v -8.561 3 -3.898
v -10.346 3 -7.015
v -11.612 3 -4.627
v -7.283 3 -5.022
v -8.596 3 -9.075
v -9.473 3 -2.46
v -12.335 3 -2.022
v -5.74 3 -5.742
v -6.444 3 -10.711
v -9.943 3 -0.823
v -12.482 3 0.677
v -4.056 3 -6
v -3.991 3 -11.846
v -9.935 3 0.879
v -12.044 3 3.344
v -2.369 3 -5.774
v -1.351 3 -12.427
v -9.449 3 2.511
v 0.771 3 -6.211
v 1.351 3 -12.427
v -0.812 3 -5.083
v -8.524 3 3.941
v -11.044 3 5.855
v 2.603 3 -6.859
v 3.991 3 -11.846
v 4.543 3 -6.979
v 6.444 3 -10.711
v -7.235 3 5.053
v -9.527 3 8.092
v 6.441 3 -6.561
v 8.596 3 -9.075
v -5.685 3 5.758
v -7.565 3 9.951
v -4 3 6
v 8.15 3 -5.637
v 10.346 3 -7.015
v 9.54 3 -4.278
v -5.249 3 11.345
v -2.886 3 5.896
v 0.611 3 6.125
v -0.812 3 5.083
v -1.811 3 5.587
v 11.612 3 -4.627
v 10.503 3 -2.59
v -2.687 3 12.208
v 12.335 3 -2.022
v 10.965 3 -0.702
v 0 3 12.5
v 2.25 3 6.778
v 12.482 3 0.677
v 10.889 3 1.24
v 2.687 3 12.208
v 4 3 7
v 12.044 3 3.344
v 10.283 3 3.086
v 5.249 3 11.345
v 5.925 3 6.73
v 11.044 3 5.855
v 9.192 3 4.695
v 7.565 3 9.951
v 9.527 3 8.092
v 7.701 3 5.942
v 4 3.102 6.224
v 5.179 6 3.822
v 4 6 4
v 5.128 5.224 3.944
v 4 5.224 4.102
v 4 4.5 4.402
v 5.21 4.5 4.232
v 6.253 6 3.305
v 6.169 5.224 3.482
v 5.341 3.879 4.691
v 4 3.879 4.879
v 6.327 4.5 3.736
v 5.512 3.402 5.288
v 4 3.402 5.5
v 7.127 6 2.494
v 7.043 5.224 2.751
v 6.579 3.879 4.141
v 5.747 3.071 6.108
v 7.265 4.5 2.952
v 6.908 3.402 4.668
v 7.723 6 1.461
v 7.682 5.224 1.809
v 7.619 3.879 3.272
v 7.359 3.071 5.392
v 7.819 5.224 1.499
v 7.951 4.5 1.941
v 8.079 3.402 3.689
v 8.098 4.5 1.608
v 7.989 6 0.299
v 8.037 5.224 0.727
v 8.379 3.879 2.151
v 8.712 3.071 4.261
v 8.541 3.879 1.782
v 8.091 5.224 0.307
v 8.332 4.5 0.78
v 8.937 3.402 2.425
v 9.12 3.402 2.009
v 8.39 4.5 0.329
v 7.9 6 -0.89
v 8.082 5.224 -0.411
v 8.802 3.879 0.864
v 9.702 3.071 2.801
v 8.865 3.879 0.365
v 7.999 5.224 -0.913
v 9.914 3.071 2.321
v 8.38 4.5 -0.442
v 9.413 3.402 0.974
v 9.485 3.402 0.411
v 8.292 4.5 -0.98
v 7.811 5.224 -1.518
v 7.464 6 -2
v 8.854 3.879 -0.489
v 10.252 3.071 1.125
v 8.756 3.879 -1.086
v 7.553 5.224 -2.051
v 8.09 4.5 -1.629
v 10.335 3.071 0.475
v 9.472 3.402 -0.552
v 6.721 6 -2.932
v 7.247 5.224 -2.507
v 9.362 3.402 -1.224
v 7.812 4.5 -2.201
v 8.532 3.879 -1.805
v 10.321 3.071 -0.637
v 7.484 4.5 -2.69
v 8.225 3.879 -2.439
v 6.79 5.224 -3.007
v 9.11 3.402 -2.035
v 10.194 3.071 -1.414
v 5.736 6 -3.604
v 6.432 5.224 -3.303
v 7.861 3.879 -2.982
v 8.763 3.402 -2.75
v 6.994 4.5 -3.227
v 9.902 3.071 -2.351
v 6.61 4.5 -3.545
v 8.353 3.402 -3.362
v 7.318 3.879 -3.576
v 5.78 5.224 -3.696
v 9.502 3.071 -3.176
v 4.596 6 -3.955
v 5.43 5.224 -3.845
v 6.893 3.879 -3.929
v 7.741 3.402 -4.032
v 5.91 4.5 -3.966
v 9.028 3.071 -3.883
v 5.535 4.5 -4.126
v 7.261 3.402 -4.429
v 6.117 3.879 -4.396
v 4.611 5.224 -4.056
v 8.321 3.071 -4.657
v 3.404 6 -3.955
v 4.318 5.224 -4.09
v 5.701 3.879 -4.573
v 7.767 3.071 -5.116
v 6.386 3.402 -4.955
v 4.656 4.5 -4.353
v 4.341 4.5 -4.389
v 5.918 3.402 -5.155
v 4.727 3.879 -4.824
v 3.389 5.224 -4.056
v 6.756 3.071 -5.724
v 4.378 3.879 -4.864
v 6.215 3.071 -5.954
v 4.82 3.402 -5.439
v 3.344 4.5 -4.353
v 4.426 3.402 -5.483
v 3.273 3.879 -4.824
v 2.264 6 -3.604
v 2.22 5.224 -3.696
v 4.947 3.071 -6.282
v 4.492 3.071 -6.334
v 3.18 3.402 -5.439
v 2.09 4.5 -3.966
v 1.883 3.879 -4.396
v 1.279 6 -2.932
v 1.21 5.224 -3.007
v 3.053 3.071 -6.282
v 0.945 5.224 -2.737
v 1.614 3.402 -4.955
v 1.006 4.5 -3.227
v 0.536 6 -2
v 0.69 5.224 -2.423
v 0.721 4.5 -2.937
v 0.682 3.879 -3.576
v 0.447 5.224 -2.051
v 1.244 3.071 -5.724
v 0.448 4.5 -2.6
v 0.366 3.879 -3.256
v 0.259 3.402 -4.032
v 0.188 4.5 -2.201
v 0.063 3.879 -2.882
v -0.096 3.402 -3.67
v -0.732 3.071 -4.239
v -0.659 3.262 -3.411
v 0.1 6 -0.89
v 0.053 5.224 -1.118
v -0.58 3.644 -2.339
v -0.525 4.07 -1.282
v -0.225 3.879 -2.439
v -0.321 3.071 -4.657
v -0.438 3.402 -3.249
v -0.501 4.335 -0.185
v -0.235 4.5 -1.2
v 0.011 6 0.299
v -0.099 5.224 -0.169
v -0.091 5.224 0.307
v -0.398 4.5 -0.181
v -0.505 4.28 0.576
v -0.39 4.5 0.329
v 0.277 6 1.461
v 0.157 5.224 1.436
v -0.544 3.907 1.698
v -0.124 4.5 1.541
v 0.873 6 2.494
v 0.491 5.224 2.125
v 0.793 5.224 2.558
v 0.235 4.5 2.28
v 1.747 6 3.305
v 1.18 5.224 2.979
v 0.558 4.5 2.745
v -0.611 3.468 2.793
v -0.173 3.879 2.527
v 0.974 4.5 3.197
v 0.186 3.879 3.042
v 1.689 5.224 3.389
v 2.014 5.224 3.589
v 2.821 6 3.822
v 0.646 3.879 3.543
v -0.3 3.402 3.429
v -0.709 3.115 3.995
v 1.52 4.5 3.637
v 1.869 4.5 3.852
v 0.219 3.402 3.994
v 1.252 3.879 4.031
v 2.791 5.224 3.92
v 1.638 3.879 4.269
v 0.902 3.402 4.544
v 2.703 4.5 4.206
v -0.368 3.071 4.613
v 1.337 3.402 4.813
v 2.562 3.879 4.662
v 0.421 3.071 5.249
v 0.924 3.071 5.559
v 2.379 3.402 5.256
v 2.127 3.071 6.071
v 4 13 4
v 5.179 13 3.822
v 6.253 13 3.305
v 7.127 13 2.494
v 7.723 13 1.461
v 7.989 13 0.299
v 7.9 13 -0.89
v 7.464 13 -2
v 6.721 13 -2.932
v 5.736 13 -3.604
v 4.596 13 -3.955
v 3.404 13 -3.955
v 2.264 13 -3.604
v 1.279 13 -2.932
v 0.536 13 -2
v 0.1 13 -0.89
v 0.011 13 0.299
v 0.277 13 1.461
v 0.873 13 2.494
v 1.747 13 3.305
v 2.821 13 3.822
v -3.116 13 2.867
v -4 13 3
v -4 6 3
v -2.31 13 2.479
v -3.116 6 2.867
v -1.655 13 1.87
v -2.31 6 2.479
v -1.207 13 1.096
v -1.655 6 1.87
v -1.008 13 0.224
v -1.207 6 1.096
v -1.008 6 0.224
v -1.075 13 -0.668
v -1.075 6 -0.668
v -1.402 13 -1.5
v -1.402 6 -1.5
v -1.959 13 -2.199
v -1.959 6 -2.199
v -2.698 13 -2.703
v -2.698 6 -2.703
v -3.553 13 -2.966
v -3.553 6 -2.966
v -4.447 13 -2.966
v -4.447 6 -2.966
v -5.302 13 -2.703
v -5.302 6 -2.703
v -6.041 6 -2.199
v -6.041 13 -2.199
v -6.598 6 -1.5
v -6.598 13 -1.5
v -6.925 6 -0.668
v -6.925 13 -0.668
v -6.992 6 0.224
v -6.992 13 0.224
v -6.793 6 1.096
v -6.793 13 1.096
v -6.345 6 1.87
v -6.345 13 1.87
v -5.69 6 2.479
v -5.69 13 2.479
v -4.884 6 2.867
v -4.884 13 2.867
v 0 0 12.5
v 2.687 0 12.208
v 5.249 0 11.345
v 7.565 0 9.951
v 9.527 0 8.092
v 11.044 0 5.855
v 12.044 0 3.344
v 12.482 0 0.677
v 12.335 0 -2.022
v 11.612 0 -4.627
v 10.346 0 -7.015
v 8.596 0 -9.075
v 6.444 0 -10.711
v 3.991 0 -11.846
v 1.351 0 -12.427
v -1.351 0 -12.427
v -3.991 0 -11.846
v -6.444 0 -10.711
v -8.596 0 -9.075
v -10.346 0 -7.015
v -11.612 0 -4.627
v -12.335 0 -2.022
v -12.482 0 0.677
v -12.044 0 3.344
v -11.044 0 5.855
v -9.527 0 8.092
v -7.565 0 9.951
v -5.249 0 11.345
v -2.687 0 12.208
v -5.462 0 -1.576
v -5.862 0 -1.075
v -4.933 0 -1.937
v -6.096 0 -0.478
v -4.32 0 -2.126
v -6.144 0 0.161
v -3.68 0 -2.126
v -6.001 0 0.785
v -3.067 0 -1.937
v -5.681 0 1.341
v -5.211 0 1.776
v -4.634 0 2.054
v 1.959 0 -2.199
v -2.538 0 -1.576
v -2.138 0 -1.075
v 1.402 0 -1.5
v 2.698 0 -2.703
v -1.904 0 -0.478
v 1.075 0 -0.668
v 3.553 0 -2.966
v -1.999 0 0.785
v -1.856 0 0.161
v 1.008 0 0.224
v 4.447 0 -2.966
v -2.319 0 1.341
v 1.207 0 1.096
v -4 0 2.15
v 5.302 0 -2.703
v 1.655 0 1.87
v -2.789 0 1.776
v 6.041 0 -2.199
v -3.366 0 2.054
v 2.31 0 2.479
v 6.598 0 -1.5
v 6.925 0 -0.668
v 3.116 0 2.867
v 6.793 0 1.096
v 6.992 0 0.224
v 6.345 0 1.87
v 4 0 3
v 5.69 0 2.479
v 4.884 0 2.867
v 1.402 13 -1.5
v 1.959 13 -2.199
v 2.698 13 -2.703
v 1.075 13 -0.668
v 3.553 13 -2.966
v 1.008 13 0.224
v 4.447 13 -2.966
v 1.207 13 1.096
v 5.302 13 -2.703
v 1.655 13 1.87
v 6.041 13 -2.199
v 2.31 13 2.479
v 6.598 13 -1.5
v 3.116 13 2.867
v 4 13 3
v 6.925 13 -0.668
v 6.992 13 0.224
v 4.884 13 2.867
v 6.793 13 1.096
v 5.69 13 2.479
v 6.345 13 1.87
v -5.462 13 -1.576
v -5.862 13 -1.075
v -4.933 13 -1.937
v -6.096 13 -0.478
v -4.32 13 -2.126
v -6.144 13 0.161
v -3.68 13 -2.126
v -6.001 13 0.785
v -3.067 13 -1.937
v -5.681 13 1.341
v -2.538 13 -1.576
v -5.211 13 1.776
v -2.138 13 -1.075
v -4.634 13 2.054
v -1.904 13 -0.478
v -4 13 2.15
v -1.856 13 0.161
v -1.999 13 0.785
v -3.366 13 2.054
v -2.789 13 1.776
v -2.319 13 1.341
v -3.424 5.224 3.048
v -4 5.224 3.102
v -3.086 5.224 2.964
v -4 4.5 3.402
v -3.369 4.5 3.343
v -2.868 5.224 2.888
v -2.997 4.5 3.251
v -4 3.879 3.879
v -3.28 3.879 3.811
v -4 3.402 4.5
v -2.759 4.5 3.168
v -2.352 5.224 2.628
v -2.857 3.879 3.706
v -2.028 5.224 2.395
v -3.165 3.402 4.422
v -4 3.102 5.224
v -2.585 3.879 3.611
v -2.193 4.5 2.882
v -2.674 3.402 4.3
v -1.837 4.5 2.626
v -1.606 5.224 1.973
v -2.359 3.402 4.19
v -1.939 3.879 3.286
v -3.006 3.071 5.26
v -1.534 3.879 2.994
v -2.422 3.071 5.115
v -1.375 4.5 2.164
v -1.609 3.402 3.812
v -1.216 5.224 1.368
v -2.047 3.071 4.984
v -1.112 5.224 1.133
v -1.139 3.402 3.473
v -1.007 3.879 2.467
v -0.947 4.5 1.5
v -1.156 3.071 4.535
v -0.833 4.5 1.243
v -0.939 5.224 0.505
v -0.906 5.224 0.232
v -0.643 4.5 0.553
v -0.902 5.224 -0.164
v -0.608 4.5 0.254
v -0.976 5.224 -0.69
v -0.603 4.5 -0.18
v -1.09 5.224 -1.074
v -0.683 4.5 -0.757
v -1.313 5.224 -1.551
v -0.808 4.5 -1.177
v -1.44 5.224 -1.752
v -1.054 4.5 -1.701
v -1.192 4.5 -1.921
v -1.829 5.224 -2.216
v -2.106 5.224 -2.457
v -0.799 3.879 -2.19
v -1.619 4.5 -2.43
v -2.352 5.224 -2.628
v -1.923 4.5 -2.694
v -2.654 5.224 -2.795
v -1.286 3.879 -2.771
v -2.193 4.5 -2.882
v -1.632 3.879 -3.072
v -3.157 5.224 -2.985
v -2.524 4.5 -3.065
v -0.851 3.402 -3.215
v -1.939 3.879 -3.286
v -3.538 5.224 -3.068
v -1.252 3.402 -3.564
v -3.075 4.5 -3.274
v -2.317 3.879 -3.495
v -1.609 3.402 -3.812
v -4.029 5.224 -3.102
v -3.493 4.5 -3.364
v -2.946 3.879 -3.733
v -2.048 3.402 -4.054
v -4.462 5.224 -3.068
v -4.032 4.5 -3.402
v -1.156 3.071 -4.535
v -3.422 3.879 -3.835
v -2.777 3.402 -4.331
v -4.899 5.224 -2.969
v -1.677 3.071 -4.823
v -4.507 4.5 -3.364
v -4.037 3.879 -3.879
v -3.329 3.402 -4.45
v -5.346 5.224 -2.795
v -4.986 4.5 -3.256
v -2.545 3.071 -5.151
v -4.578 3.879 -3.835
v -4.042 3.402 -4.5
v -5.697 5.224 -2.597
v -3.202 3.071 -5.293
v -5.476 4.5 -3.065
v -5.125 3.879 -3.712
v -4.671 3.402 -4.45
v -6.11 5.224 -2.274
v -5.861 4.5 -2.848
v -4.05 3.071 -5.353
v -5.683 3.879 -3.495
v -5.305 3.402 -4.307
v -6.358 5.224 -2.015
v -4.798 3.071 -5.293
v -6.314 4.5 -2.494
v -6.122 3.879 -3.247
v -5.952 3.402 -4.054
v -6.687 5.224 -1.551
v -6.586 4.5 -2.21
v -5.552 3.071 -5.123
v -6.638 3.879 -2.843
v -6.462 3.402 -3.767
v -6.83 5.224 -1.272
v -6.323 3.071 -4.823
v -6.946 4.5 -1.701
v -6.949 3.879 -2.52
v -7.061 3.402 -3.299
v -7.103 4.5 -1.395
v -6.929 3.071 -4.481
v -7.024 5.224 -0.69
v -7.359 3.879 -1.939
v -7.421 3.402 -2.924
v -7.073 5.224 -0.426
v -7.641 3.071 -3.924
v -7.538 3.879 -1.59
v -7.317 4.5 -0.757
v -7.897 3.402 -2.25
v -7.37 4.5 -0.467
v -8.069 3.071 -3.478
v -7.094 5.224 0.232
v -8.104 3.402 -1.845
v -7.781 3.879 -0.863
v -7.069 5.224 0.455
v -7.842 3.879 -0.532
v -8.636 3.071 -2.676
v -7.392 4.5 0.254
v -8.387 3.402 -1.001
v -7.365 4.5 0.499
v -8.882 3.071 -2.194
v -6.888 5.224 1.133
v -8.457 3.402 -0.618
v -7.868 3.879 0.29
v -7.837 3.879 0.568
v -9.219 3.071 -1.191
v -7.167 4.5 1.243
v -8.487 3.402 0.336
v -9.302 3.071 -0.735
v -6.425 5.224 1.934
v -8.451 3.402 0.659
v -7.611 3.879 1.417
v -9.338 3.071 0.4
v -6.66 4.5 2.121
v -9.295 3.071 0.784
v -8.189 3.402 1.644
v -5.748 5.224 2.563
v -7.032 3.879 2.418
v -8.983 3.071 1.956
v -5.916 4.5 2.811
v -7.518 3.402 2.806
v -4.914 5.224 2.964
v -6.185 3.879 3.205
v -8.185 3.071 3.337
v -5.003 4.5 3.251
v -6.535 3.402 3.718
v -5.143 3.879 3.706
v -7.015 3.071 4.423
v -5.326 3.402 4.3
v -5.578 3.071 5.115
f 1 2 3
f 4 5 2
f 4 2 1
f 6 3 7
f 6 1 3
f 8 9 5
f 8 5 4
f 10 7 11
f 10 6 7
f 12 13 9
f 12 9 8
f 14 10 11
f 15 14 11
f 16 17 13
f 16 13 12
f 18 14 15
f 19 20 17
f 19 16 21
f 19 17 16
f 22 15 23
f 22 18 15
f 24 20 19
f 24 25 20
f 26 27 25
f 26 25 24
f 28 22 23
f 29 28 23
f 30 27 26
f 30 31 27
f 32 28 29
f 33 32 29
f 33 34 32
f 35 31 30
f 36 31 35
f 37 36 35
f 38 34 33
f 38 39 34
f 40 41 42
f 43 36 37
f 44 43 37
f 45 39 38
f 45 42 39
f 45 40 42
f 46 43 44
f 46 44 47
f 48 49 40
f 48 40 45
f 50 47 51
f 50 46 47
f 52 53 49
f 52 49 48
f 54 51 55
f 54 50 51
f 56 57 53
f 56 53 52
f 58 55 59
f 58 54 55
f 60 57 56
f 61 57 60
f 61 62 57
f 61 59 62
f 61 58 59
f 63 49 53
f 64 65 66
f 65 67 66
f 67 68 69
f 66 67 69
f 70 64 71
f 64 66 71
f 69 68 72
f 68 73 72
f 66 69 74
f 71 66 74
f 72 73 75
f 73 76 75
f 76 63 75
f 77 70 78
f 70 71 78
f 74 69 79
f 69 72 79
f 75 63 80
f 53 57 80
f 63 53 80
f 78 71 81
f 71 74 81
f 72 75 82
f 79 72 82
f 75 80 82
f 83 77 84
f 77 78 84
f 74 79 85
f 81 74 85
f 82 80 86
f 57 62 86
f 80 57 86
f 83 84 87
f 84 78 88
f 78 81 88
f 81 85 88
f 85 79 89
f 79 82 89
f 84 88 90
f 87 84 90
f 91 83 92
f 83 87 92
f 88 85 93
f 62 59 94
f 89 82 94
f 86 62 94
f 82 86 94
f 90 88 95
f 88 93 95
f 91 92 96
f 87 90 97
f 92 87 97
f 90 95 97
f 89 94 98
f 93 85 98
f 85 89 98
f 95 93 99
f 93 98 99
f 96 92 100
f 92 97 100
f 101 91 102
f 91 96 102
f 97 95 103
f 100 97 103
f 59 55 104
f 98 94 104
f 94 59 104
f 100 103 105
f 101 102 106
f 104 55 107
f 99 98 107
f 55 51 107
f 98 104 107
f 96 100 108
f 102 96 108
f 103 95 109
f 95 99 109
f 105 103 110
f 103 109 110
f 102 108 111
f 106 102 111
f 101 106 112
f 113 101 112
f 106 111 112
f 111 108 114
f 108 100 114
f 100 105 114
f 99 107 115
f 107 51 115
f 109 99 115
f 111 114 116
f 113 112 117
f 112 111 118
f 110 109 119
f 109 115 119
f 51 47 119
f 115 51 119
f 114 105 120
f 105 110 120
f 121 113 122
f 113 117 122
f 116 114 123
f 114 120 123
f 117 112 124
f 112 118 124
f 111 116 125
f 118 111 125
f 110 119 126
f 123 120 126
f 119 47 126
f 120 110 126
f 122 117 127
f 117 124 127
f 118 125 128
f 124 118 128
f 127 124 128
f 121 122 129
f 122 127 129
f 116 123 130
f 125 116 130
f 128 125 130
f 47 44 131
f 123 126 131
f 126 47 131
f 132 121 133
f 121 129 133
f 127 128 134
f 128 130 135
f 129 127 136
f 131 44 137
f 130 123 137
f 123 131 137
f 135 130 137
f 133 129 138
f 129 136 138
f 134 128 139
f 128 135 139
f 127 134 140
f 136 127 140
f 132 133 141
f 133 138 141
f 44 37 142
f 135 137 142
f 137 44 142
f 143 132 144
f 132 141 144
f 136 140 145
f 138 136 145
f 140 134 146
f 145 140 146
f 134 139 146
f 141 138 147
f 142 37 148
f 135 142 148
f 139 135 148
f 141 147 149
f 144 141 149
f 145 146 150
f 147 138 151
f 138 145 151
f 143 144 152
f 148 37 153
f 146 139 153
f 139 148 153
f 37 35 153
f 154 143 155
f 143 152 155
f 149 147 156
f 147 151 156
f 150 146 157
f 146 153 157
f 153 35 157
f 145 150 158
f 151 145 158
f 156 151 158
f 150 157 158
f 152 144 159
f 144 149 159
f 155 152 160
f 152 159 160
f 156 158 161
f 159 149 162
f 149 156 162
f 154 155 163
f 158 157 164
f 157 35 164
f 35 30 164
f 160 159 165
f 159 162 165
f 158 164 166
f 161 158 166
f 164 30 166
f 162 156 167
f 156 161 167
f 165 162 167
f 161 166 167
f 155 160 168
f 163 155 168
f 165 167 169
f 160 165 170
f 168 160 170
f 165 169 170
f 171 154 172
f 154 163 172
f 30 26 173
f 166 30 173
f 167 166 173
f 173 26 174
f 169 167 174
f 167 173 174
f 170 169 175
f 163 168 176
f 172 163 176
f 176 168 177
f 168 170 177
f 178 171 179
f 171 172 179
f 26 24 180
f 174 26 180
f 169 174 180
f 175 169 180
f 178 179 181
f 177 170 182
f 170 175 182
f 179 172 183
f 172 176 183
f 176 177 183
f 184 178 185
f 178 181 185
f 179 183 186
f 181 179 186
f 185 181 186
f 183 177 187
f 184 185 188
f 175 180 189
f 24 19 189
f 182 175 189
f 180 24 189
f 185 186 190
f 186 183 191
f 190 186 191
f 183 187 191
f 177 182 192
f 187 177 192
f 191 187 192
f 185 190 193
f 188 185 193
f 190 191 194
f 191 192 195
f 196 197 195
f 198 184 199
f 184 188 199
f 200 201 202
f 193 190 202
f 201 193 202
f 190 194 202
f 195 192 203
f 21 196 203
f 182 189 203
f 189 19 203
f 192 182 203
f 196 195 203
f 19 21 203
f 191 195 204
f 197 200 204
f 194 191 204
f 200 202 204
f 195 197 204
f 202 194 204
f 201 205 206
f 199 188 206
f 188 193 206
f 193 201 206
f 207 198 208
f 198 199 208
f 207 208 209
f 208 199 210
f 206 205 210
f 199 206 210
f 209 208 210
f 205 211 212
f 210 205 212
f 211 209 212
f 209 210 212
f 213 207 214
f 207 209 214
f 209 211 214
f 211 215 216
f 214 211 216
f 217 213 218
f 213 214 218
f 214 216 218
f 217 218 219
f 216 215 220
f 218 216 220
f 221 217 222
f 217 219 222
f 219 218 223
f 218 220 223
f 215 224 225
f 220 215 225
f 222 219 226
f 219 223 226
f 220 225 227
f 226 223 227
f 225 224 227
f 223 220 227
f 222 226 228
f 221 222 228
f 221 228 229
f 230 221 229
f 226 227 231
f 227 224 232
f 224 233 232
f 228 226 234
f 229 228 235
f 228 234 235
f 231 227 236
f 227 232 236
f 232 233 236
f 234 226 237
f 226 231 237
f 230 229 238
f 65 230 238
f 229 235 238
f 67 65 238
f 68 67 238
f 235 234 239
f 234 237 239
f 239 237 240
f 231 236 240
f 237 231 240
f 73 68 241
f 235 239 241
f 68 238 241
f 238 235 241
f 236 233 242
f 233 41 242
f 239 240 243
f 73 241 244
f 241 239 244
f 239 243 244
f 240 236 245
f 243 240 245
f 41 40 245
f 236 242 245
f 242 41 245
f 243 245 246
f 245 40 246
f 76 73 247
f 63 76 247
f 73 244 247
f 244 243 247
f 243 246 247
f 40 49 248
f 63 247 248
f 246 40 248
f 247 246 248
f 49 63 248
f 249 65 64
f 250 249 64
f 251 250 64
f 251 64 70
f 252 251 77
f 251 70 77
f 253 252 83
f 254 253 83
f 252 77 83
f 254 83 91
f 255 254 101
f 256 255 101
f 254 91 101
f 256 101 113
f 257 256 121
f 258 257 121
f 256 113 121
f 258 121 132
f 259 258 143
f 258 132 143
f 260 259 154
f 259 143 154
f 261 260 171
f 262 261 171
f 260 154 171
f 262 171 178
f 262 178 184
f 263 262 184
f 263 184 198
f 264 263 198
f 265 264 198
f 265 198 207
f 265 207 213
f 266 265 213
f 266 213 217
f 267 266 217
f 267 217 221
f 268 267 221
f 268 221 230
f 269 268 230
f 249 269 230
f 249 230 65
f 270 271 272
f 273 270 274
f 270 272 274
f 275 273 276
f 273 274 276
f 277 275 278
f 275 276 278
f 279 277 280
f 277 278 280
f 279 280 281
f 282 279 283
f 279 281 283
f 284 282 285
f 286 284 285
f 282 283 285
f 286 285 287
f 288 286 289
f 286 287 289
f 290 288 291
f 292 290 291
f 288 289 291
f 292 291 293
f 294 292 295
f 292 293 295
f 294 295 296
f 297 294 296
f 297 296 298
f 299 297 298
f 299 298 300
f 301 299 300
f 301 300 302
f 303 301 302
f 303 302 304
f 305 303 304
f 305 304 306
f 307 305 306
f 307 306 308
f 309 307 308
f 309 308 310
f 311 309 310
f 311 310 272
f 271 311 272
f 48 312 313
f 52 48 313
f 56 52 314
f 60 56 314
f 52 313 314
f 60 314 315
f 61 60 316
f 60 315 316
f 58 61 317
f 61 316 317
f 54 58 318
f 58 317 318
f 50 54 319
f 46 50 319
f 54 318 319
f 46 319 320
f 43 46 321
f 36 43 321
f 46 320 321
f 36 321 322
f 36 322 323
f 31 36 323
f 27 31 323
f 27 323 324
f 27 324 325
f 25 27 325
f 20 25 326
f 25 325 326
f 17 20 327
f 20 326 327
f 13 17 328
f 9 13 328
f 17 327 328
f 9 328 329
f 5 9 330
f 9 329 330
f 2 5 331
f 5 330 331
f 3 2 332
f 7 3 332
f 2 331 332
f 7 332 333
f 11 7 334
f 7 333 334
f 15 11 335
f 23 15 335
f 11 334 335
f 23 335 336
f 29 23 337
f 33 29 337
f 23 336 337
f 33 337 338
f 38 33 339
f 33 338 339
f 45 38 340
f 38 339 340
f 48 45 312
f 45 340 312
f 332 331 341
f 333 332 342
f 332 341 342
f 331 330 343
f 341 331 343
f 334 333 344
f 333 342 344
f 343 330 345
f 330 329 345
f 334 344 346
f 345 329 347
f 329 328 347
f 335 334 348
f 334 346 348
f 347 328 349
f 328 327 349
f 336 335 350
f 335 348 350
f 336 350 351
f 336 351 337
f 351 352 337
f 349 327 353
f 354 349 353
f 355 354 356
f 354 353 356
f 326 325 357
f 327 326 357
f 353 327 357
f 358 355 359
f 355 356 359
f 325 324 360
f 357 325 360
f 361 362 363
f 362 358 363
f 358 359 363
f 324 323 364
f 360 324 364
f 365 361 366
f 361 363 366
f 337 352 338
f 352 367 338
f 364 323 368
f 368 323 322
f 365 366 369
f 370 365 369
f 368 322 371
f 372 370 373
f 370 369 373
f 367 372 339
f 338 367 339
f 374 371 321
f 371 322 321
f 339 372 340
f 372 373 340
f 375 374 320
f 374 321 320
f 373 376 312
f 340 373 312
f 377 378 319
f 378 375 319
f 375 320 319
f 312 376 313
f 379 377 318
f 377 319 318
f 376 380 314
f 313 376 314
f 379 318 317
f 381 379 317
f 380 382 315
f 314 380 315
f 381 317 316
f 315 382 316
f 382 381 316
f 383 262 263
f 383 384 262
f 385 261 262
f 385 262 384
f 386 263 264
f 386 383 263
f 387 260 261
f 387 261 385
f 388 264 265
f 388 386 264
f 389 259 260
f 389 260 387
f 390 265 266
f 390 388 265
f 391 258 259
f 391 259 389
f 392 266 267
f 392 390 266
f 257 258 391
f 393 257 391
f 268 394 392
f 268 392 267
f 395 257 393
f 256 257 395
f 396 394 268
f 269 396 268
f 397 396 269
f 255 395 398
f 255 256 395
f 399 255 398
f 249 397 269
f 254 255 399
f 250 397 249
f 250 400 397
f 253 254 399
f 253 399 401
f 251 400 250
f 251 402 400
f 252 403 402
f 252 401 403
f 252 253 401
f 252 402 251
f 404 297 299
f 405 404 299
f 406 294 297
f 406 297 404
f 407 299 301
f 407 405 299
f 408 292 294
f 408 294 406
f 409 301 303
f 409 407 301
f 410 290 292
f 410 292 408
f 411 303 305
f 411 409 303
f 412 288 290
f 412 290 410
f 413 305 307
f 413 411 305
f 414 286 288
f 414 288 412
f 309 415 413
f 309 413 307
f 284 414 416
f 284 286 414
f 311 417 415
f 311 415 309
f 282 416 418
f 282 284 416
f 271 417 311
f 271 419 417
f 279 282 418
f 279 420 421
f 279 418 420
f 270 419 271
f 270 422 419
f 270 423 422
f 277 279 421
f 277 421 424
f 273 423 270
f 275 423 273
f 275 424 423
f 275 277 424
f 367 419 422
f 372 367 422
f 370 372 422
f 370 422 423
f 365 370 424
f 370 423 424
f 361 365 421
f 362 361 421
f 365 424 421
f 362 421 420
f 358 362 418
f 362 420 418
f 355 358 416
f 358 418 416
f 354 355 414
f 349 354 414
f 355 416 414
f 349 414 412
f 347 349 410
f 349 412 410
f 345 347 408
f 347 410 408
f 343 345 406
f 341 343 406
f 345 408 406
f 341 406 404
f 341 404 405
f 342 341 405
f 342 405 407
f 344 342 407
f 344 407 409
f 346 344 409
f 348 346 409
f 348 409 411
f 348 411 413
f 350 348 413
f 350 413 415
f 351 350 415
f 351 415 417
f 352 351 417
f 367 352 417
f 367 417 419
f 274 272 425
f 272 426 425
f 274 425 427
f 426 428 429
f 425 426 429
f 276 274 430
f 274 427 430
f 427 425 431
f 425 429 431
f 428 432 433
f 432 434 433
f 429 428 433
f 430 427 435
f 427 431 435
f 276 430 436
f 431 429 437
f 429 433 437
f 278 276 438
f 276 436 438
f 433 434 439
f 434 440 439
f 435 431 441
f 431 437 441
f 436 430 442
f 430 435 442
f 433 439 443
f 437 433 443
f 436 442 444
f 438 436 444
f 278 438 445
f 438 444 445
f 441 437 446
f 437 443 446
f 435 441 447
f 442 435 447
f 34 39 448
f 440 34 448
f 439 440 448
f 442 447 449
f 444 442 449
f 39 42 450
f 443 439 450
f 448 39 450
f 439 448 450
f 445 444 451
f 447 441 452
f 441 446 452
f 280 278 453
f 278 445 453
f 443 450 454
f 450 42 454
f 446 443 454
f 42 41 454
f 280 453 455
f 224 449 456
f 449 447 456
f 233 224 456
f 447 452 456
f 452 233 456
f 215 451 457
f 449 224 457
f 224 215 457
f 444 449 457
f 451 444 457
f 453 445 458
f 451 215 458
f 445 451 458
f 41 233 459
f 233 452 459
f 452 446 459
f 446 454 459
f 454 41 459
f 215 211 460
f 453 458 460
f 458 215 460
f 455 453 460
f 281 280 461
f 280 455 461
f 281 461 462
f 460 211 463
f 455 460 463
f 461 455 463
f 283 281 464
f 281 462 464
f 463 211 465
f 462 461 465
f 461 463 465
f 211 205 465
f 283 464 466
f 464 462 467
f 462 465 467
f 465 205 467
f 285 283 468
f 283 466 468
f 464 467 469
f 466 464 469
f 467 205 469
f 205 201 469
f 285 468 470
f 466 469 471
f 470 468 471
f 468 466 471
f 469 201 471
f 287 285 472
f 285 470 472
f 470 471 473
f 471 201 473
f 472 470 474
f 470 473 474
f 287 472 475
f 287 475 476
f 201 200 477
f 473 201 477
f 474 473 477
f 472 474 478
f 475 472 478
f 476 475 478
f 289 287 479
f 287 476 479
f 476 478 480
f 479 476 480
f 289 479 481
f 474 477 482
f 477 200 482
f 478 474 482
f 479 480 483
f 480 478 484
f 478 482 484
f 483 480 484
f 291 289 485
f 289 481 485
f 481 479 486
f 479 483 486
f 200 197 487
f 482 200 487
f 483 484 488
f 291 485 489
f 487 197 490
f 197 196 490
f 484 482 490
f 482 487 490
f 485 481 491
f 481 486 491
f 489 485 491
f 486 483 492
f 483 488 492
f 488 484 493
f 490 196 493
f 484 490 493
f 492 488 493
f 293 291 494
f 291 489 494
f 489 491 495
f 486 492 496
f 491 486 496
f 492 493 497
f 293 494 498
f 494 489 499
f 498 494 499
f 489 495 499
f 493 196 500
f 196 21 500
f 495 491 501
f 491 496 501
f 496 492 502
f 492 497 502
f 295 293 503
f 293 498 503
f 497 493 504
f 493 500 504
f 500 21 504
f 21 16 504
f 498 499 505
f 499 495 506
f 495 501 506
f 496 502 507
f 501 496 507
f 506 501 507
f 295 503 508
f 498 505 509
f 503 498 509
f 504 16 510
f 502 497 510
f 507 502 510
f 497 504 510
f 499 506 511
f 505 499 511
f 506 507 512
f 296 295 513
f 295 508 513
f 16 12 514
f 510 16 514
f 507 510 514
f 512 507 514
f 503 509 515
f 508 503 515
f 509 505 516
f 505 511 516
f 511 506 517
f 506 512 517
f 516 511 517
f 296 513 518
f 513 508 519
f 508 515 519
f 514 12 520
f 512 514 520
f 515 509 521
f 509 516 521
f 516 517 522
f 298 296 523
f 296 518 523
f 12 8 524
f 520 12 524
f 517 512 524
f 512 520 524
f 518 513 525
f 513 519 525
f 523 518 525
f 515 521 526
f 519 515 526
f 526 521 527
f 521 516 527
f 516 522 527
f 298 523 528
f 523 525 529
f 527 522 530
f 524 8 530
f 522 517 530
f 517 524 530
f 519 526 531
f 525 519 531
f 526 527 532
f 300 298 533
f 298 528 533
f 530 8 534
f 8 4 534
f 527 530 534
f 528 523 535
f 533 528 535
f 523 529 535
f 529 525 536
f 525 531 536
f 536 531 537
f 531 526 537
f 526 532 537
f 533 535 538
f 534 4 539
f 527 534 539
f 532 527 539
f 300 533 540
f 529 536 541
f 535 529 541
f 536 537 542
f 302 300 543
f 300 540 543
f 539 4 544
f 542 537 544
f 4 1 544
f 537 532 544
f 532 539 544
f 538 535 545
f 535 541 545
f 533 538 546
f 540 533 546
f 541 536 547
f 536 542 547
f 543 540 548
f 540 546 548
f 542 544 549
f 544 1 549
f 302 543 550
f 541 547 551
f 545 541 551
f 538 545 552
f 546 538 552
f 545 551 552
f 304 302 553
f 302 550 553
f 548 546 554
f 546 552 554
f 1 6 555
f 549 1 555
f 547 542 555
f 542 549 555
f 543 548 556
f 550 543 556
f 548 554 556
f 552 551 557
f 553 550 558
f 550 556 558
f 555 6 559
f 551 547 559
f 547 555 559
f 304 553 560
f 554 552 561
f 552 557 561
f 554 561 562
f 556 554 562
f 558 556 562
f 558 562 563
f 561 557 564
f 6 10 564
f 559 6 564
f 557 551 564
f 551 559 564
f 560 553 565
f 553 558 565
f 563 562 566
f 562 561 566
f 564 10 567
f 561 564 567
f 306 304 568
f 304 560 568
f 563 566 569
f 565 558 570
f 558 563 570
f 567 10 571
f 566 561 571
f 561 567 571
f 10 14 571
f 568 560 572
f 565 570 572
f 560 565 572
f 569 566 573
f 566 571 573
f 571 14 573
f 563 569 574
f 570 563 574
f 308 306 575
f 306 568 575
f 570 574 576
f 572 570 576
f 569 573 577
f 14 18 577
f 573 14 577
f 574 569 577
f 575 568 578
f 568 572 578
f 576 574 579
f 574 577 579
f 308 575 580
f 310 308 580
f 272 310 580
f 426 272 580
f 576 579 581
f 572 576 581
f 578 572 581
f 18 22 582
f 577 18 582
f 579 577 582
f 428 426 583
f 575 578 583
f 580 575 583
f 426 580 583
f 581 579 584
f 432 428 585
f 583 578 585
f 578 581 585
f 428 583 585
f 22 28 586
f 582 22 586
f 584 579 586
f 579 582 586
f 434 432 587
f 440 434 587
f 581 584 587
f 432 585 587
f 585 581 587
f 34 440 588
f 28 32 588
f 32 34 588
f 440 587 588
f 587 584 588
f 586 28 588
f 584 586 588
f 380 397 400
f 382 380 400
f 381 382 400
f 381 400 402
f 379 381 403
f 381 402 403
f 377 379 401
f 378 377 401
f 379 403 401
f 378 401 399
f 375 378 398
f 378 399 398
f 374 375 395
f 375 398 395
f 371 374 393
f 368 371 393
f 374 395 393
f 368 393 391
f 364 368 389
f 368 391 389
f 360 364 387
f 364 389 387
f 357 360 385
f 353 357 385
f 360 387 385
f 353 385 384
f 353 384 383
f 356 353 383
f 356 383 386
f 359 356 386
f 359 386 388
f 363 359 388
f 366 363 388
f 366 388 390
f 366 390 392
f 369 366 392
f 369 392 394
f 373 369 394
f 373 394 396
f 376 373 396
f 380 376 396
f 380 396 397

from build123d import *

# Parameters (mm, degrees)
SKETCH1_R           = 12.5
BOSS_EXTRUDE1_DEPTH = 3
SKETCH2_R           = 4
SKETCH2_R_2         = 3
BOSS_EXTRUDE2_DEPTH = 10
SKETCH3_R           = 2.15
SKETCH3_R_2         = 3
CUT_EXTRUDE1_DEPTH  = 22.943108257
FILLET1_R           = 3


with BuildPart() as part:
    # Sketch1 → Boss-Extrude1 (new body)
    with BuildSketch(Plane(origin=(0, 0, 0), x_dir=(1, 0, 0), z_dir=(0, 1, 0))):
        with Locations(Location((0, 0, 0), (0, 0, 270))):
            Circle(SKETCH1_R)
    extrude(amount=BOSS_EXTRUDE1_DEPTH)

    # Sketch2 → Boss-Extrude2 (add)
    with BuildSketch(Plane(origin=(0, 3, 0), x_dir=(1, 0, 0), z_dir=(0, 1, 0))):
        with Locations(Location((4, 0, 0), (0, 0, 270))):
            Circle(SKETCH2_R)
        with Locations(Location((-4, 0, 0), (0, 0, 270))):
            Circle(SKETCH2_R_2)
    extrude(amount=BOSS_EXTRUDE2_DEPTH)

    # Sketch3 → Cut-Extrude1 (cut, through all)
    with BuildSketch(Plane(origin=(0, 13, 0), x_dir=(1, 0, 0), z_dir=(0, 1, 0))):
        with Locations(Location((-4, 0, 0), (0, 0, 270))):
            Circle(SKETCH3_R)
        with Locations(Location((4, 0, 0), (0, 0, 270))):
            Circle(SKETCH3_R_2)
    extrude(amount=-CUT_EXTRUDE1_DEPTH, mode=Mode.SUBTRACT)

    # Fillet1
    # the kernel refuses this fillet: 3 mm, written as the material it adds along each edge
    with BuildSketch(Plane(origin=(4, 3, 0), x_dir=(0, 0, 1), z_dir=(-1, 0, 0))) as fillet1_piece_1_section:
        with BuildLine():
            CenterArc((4 + FILLET1_R, FILLET1_R), FILLET1_R, 180, 90)
            Line((4, FILLET1_R), (4, 0))
            Line((4, 0), (4 + FILLET1_R, 0))
        make_face()
    fillet1_piece_1 = revolve(axis=Axis((4, 3, 0), (0, 1, 0)), mode=Mode.PRIVATE)
    fillet1_piece_1 = fillet1_piece_1 - Plane(origin=(-4, 3.851709764, 0), x_dir=(0, 0, 1), z_dir=(0, -1, 0)) * Cylinder(3, 29, mode=Mode.PRIVATE)
    add(fillet1_piece_1)
    with BuildSketch(Plane(origin=(-4, 3, 0), x_dir=(0, 0, 1), z_dir=(-1, 0, 0))) as fillet1_piece_2_section:
        with BuildLine():
            CenterArc((3 + FILLET1_R, FILLET1_R), FILLET1_R, 180, 90)
            Line((3, FILLET1_R), (3, 0))
            Line((3, 0), (3 + FILLET1_R, 0))
        make_face()
    fillet1_piece_2 = revolve(axis=Axis((-4, 3, 0), (0, 1, 0)), mode=Mode.PRIVATE)
    fillet1_piece_2 = fillet1_piece_2 - Plane(origin=(4, 3.853854746, 0), x_dir=(0, 0, 1), z_dir=(0, -1, 0)) * Cylinder(4, 24, mode=Mode.PRIVATE)
    add(fillet1_piece_2)


solid = part.part
